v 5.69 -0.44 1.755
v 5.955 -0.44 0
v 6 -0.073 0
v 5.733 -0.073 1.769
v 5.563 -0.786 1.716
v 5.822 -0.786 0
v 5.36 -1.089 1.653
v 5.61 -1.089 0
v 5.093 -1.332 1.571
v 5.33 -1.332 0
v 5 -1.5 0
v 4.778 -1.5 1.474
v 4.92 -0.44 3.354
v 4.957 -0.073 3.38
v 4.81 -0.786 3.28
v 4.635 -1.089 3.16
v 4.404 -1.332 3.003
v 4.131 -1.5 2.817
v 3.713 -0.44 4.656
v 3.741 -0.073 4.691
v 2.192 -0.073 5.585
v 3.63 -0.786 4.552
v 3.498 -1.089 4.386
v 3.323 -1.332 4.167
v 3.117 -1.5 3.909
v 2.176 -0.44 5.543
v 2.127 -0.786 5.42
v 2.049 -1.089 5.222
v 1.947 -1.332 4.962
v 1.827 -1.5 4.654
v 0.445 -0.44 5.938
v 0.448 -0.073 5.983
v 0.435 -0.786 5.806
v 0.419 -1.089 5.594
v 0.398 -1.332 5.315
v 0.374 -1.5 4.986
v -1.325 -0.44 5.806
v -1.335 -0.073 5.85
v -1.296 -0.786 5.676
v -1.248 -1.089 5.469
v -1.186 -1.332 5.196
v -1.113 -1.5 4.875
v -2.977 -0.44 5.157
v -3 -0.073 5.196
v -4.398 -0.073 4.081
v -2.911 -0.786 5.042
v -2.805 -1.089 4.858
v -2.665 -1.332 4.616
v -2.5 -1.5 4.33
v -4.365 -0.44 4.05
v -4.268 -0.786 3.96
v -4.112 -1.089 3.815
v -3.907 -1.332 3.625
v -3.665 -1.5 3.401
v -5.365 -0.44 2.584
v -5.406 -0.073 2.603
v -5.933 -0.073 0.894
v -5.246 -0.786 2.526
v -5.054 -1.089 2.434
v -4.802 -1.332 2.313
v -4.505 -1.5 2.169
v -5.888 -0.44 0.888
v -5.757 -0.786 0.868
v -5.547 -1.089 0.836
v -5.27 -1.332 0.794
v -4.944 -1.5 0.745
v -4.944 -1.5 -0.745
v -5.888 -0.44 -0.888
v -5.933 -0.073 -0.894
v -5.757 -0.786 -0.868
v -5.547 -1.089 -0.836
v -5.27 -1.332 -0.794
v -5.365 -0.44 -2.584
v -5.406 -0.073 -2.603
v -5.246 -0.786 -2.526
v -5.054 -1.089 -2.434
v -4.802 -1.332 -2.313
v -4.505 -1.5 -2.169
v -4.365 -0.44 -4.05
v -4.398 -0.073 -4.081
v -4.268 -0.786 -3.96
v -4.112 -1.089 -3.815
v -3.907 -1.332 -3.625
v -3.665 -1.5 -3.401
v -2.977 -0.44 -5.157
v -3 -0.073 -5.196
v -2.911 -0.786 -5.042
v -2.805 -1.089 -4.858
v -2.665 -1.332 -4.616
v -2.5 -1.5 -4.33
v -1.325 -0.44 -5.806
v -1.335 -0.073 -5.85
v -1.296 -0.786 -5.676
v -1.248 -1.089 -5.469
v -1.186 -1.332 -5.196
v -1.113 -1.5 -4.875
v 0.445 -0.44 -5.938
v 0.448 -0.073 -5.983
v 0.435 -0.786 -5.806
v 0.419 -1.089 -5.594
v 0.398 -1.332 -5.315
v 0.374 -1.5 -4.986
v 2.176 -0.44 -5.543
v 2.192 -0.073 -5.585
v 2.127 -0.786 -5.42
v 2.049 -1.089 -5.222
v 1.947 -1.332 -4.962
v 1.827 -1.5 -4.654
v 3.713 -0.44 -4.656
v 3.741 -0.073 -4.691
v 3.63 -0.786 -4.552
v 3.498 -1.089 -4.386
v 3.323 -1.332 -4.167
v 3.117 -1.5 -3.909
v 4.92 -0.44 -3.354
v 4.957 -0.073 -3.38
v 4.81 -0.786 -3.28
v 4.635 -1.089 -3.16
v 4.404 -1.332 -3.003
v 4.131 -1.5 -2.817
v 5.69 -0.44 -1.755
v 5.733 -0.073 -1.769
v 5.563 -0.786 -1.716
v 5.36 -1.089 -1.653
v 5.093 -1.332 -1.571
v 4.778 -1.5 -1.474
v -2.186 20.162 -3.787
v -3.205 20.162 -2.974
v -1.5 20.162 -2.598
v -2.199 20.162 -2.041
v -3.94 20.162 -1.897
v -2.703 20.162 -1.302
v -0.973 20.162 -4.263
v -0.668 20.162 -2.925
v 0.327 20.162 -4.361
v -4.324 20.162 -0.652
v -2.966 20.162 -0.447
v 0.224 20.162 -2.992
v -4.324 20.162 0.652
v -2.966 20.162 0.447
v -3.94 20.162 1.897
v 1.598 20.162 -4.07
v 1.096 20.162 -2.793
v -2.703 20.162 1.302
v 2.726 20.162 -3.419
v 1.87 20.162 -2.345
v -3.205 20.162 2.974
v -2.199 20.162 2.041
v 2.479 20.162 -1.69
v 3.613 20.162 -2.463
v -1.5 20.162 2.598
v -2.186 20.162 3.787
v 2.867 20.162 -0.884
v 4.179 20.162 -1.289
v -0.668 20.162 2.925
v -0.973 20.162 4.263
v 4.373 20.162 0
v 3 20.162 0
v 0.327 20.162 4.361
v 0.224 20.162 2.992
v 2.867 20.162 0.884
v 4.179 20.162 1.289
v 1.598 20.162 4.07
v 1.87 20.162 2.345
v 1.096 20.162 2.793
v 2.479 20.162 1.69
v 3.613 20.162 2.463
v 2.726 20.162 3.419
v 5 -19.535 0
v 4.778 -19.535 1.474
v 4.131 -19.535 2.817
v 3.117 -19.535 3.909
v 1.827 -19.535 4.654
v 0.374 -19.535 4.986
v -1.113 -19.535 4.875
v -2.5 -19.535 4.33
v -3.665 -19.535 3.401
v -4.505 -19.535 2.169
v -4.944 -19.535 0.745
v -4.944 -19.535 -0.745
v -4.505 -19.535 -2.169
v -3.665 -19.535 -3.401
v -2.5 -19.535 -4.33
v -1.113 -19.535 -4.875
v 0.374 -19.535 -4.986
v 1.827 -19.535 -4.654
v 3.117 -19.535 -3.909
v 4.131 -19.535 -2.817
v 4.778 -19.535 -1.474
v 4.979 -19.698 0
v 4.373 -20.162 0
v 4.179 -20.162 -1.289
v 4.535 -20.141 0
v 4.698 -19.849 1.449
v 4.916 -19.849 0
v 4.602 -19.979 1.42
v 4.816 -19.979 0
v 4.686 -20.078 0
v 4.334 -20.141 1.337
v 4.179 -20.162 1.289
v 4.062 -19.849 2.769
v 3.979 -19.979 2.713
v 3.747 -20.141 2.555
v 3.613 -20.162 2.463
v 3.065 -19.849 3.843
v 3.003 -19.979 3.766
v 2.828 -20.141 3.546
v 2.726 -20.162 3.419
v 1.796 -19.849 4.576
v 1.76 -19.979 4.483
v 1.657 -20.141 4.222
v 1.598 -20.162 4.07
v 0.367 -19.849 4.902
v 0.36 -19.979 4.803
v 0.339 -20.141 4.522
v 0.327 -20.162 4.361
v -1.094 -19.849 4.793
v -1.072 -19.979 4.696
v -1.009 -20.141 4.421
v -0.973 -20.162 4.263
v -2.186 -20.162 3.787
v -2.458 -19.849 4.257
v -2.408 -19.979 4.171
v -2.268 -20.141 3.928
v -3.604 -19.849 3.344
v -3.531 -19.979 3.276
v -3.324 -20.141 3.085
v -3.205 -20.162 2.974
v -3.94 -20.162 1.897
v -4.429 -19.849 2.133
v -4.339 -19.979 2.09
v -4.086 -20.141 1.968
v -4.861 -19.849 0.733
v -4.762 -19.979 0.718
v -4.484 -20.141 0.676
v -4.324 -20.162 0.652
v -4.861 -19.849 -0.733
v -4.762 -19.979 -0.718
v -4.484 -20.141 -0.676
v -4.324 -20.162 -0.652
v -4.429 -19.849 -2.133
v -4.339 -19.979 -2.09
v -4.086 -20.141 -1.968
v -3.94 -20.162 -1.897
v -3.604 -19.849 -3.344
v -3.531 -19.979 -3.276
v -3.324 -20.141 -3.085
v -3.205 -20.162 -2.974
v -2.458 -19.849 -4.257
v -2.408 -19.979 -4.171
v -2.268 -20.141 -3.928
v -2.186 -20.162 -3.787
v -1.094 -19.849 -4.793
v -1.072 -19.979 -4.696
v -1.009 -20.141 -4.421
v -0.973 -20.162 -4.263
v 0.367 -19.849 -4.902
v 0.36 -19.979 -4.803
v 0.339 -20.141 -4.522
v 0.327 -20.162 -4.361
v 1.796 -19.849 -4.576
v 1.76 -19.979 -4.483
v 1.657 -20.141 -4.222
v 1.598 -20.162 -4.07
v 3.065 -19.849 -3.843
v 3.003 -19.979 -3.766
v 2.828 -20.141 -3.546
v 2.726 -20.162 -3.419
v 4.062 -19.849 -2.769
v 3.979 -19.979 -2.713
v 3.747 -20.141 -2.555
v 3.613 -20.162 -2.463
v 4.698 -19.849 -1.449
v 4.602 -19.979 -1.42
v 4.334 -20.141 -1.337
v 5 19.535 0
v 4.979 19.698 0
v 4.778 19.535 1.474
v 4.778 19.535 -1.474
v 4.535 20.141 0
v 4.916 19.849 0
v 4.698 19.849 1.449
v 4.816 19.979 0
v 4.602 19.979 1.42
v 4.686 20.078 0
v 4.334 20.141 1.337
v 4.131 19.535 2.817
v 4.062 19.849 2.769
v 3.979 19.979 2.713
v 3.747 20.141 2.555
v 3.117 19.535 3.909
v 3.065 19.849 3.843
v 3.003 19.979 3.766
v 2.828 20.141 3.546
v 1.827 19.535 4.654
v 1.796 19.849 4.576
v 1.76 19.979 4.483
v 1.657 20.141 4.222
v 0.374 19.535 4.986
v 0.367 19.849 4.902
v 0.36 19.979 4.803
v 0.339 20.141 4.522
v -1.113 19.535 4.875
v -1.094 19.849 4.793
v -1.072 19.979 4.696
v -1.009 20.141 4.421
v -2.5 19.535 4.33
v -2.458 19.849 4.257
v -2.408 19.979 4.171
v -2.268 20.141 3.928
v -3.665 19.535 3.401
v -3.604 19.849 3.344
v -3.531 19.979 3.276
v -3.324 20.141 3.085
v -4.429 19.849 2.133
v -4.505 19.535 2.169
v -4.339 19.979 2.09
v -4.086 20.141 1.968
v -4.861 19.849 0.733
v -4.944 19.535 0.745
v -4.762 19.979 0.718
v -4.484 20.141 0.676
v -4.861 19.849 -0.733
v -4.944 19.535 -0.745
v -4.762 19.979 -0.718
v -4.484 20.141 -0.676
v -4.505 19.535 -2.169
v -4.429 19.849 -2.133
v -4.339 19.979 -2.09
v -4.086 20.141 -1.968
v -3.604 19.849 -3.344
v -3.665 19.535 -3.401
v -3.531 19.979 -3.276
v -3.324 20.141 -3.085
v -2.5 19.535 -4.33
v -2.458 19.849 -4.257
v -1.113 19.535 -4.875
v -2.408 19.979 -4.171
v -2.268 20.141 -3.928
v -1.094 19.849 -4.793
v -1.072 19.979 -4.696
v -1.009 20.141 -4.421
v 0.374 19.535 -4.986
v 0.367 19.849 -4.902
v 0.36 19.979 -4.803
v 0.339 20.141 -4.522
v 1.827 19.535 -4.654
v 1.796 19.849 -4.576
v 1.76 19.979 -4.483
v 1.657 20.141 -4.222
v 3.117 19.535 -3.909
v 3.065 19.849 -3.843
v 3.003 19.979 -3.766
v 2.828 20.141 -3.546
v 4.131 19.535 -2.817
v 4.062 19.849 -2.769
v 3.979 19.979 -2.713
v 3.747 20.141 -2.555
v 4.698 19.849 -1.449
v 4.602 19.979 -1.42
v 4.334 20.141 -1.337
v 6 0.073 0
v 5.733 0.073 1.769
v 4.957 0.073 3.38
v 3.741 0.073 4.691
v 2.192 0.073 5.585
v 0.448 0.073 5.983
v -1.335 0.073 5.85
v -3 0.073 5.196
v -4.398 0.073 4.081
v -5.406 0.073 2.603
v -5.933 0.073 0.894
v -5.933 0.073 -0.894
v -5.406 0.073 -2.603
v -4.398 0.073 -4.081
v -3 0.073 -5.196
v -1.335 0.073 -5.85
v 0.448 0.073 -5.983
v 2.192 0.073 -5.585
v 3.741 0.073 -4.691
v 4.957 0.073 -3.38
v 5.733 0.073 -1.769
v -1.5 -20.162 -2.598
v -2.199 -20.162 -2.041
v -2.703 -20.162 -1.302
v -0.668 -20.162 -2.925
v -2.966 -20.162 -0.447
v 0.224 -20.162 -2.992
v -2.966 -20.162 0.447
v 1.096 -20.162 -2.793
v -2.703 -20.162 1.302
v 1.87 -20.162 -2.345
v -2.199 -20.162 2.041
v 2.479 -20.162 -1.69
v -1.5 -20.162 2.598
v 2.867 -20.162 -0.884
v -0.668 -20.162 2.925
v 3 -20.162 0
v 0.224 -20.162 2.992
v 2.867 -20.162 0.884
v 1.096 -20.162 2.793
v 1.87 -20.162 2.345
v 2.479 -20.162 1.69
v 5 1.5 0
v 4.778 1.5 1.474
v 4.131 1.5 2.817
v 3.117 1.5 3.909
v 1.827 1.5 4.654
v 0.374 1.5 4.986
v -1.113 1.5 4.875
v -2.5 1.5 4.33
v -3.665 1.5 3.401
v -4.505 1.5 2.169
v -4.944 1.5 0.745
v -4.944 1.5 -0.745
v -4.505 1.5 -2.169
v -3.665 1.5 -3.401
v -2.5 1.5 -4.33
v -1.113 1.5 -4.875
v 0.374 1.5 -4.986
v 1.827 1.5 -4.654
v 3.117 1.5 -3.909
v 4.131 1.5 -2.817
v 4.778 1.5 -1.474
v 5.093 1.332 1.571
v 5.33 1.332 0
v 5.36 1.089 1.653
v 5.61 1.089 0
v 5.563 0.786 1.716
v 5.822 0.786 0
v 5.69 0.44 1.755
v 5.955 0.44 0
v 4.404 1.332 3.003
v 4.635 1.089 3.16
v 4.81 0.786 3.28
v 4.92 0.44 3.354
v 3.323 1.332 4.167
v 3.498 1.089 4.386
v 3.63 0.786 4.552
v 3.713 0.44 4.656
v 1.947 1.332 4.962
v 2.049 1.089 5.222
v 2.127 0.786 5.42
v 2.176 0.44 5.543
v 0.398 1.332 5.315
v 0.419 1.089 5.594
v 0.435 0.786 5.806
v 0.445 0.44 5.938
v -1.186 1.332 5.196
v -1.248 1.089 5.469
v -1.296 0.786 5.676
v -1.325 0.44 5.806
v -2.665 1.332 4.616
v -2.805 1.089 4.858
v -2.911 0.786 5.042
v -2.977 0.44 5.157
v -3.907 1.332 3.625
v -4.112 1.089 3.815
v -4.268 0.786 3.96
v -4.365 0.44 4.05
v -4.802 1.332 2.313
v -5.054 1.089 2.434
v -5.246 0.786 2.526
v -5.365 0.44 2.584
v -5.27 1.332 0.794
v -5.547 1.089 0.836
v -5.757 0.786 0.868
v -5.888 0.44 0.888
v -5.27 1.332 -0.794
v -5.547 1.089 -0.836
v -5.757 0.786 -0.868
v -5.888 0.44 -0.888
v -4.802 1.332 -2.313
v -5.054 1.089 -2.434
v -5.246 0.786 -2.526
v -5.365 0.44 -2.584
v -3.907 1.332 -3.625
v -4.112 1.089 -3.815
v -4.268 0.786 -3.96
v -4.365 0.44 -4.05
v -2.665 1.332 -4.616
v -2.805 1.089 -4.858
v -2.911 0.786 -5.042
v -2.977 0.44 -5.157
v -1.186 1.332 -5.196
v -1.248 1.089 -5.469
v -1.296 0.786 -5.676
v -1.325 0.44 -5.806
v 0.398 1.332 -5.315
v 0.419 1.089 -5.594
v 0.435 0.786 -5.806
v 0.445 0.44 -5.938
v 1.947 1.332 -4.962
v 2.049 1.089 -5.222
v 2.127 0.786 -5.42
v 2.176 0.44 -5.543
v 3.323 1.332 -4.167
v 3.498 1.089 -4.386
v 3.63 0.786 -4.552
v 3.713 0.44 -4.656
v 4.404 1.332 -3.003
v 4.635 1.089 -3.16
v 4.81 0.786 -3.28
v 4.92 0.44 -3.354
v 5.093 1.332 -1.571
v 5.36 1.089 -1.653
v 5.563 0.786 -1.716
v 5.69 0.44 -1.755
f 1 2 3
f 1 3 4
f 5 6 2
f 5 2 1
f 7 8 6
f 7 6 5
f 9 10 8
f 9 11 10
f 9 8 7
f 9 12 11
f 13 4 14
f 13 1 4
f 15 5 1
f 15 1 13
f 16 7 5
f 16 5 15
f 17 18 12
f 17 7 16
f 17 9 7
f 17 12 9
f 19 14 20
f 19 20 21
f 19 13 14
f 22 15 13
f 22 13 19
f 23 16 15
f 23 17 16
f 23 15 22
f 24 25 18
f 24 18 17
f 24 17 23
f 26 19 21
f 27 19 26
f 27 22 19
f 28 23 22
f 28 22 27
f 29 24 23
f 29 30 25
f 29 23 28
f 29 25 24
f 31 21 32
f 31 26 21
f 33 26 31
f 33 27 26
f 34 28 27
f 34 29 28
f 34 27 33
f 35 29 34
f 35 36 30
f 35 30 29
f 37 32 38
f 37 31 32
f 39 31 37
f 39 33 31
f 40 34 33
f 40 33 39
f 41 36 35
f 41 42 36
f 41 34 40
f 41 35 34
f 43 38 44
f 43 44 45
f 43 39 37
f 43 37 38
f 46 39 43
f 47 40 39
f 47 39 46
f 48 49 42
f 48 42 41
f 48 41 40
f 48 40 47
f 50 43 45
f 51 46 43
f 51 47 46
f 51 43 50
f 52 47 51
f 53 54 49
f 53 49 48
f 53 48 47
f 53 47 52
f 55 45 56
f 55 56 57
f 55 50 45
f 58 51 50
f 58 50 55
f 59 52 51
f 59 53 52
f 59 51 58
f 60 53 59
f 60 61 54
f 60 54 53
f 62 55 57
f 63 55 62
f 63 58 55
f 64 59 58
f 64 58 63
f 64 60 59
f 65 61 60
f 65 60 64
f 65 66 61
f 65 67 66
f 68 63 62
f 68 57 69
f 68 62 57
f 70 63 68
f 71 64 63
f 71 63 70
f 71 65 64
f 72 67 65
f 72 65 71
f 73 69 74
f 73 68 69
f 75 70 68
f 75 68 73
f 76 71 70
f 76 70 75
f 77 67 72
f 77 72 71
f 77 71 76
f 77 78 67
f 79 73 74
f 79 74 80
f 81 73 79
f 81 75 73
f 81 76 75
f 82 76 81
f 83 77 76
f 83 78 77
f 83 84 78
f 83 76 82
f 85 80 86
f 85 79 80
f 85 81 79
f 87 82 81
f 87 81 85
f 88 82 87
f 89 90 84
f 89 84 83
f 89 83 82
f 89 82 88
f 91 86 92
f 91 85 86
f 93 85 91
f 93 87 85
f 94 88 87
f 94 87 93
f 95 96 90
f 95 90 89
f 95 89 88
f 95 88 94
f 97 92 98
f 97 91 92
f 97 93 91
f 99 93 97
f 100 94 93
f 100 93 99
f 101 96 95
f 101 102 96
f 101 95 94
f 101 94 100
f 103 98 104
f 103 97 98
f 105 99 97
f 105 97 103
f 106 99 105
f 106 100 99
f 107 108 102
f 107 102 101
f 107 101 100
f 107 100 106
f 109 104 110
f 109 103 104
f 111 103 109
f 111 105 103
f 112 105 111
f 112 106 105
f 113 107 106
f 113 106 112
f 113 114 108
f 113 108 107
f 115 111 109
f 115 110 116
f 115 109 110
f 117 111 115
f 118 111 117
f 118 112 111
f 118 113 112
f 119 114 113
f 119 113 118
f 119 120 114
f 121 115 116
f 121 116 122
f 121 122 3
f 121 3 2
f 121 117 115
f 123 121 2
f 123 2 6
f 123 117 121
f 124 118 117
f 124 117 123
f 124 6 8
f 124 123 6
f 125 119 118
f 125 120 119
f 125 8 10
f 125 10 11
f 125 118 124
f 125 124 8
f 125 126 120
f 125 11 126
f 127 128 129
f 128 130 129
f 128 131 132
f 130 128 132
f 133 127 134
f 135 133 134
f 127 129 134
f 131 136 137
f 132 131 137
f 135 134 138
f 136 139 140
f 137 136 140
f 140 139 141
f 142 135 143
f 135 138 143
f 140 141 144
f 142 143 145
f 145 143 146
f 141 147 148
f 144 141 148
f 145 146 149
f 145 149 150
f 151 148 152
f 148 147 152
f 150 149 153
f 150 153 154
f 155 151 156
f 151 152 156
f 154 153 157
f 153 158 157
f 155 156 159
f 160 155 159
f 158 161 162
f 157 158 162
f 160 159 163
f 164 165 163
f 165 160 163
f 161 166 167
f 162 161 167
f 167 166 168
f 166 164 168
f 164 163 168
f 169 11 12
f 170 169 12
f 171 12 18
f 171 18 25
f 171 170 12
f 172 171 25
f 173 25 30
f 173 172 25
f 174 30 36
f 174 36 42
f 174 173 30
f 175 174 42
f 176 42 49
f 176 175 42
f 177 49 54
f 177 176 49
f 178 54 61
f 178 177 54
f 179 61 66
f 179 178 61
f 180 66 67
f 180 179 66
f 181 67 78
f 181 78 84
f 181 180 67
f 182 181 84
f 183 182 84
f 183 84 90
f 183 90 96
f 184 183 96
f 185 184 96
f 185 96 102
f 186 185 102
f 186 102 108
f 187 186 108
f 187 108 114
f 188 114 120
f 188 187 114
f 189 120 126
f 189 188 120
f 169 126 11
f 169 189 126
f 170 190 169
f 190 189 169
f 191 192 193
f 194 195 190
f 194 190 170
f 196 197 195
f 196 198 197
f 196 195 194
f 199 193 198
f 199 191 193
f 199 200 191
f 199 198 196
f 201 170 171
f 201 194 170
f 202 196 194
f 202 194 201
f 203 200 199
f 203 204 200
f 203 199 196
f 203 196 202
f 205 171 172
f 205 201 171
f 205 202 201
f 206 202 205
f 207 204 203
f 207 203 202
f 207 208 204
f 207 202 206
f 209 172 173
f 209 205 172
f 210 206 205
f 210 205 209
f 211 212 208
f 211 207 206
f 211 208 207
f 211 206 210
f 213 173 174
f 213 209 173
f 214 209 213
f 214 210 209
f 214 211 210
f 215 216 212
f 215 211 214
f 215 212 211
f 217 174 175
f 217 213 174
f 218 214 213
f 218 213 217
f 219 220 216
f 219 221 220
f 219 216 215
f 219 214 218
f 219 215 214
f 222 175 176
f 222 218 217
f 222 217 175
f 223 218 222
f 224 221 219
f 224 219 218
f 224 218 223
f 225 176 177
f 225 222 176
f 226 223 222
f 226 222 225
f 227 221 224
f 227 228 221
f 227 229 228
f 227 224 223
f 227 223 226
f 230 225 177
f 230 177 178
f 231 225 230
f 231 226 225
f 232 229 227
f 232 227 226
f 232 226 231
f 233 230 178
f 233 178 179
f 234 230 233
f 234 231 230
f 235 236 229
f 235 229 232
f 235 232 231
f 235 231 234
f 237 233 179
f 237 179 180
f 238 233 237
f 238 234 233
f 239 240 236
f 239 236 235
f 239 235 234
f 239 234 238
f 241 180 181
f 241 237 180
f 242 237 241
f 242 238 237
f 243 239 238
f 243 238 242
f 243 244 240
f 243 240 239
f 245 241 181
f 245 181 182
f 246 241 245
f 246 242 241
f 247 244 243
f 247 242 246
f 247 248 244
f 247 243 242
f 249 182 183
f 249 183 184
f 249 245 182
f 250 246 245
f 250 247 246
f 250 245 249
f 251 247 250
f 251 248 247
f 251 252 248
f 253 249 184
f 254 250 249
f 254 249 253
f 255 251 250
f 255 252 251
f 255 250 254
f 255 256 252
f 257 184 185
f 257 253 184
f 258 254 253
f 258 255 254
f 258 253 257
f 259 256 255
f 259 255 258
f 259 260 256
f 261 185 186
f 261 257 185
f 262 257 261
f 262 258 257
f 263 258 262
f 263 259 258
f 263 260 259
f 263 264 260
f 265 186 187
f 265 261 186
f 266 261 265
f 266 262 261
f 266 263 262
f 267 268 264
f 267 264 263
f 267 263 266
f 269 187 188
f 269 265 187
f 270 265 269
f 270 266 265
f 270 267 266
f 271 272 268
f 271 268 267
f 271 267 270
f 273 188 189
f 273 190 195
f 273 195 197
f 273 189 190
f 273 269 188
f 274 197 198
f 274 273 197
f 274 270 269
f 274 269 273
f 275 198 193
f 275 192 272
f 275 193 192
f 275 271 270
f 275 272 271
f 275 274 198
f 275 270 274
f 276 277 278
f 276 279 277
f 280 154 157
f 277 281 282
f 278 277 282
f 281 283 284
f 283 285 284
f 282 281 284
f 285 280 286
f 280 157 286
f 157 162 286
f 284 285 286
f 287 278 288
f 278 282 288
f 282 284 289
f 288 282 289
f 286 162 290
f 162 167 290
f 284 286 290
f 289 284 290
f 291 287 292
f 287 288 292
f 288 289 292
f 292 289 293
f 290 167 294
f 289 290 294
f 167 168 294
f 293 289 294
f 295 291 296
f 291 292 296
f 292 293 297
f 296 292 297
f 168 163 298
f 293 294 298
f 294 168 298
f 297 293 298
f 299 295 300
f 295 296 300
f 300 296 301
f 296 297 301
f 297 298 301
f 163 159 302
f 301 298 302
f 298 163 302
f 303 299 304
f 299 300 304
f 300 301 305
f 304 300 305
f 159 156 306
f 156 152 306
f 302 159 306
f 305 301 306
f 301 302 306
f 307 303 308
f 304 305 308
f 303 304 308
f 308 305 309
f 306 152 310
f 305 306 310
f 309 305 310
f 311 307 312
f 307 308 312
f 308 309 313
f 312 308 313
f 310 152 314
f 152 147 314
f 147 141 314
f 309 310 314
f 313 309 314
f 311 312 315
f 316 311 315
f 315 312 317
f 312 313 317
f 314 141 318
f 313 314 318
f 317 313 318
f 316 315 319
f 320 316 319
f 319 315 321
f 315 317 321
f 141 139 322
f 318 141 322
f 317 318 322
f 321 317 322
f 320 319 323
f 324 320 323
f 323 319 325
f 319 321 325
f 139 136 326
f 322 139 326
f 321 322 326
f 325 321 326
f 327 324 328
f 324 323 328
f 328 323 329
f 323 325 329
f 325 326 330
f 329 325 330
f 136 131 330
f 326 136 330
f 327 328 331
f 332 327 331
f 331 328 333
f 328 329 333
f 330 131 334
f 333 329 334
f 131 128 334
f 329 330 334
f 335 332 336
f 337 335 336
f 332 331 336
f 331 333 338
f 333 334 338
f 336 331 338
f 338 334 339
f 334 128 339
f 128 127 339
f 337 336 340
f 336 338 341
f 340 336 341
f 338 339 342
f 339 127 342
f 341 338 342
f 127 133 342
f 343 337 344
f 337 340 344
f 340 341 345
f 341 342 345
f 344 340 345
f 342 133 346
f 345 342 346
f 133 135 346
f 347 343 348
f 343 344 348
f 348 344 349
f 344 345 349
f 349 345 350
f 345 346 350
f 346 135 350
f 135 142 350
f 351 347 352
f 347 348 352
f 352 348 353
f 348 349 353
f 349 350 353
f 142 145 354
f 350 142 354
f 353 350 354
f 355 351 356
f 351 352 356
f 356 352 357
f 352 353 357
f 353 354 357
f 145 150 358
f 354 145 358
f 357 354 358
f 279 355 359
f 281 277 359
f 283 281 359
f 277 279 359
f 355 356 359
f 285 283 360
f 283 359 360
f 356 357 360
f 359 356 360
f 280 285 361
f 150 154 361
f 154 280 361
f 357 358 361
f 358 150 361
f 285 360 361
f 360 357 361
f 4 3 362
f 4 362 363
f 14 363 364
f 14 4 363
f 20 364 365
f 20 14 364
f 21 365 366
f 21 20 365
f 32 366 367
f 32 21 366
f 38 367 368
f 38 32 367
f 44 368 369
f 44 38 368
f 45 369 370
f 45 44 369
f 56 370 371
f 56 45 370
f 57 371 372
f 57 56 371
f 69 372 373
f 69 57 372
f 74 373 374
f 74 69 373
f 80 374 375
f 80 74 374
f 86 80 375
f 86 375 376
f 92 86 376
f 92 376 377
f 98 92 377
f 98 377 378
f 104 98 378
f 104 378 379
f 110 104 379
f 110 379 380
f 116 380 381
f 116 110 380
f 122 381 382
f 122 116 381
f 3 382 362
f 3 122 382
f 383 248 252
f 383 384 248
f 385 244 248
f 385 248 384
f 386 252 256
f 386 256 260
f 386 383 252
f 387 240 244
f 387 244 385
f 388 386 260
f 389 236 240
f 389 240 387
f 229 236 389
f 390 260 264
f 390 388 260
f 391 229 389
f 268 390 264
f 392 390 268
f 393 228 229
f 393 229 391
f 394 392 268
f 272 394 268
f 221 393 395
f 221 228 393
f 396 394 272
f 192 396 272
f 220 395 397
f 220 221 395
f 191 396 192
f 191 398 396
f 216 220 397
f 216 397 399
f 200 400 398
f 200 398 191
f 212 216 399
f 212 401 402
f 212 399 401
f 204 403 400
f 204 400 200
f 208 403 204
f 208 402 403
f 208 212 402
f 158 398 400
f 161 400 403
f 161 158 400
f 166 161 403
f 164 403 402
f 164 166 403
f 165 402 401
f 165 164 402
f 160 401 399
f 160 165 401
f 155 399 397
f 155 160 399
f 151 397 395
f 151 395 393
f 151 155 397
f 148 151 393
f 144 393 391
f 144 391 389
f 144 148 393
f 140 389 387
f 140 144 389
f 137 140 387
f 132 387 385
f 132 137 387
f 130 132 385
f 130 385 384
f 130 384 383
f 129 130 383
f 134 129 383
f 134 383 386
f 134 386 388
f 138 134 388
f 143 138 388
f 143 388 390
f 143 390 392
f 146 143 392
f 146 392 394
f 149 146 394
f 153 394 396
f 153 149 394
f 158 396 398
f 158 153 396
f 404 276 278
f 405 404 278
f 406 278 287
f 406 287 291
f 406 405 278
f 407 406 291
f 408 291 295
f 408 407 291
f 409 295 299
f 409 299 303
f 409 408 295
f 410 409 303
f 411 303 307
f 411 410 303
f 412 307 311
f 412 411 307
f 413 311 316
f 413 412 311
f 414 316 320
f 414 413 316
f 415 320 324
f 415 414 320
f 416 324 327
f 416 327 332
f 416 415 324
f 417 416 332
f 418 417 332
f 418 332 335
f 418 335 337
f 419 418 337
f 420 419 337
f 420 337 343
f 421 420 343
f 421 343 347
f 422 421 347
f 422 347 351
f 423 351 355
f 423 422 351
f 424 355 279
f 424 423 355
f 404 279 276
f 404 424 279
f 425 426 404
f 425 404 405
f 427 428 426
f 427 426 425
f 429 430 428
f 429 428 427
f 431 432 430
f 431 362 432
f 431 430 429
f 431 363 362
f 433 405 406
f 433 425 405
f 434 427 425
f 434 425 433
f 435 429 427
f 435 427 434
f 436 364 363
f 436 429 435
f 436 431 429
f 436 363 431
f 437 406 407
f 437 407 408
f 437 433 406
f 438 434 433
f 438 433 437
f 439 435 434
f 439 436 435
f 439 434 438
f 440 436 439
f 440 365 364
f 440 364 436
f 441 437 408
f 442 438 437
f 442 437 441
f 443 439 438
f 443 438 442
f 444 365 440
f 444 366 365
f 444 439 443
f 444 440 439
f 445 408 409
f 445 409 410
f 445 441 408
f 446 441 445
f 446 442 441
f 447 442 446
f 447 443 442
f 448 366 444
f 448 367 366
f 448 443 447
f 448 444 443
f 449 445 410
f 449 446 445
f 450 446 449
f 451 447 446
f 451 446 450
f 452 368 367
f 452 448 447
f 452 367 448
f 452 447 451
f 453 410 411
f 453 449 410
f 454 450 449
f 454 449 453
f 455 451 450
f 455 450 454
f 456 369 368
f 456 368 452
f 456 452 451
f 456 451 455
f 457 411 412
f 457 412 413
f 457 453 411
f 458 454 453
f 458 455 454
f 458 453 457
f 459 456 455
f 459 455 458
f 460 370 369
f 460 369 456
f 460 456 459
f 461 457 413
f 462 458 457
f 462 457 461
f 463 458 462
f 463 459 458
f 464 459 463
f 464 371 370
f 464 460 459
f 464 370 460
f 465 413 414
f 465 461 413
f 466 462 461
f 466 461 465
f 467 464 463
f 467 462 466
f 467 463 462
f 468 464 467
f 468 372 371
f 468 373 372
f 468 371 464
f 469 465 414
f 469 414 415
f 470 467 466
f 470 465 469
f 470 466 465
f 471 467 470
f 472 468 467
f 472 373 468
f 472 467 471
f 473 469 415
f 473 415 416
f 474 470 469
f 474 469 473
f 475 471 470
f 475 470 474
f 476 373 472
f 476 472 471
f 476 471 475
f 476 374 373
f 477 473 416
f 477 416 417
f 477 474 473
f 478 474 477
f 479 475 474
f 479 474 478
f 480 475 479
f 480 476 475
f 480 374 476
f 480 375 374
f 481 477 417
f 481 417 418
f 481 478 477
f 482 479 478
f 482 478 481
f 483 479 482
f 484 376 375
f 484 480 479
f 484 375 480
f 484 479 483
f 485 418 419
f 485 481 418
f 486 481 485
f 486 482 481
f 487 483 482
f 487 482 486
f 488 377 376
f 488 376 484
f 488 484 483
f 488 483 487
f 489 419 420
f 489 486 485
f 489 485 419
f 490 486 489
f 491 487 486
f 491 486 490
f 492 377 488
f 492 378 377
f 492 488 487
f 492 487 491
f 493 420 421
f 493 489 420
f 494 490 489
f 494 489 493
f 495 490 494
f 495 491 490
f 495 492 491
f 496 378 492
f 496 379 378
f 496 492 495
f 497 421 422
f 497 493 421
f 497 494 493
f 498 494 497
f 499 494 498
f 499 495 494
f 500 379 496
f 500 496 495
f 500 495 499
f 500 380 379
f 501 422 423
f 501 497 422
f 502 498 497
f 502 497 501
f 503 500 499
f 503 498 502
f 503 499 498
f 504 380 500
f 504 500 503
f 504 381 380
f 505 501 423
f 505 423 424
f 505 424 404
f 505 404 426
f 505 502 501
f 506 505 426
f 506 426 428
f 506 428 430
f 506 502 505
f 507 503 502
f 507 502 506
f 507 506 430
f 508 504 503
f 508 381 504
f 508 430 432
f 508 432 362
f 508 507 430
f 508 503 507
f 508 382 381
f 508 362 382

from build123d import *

# Parameters (mm, degrees)
F0_R     = 5
F0_R_2   = 3
F1_DEPTH = 20.162448287
F2_R     = 0.6272281394
F0_R_3   = 6
F3_DEPTH = 1.5


# Not quite as in the source:
# - a fillet or chamfer that OpenCascade refuses, or shapes differently, is made with other operations: its cross-section is extruded or revolved along the edge and cut away or added


with BuildPart() as f1:
    # F0 (on Front) → F1 (new body, symmetric)
    with BuildSketch(Plane.XZ):
        Circle(F0_R)
        Circle(F0_R_2, mode=Mode.SUBTRACT)
    extrude(amount=F1_DEPTH, both=True)

    # F2
    f2_edges = [f1.edges().sort_by_distance(p)[0] for p in [
        (-5, -20.162448, 0),
        (-5, 20.162448, 0),
    ]]
    fillet(f2_edges, radius=F2_R)

    # F0 (on Front) → F3 (join, symmetric)
    with BuildSketch(Plane.XZ):
        Circle(F0_R_3)
        Circle(F0_R, mode=Mode.SUBTRACT)
    extrude(amount=F3_DEPTH, both=True)

    # F4: fillet of radius 1.5182281224 on 2 edges, made by hand

    # F4_s1 → F4_t2 (revolve, cut)
    with BuildSketch(Plane.XY):
        with BuildLine():
            ThreePointArc((5, 1.5), (5.7251151811, 0.9442269358), (6, 0.072955416))
            Line((6, 0.072955416), (6, 1.5))
            Line((6, 1.5), (5, 1.5))
        make_face()
    revolve(axis=Axis((0, 1.5, 0), (0, -1, 0)), mode=Mode.SUBTRACT)

    # F4_s3 → F4_t4 (revolve, cut)
    with BuildSketch(Plane.XY):
        with BuildLine():
            ThreePointArc((6, -0.072955416), (5.7251151811, -0.9442269358), (5, -1.5))
            Line((5, -1.5), (6, -1.5))
            Line((6, -1.5), (6, -0.072955416))
        make_face()
    revolve(axis=Axis((0, -1.5, 0), (0, -1, 0)), mode=Mode.SUBTRACT)


solid = f1.part
